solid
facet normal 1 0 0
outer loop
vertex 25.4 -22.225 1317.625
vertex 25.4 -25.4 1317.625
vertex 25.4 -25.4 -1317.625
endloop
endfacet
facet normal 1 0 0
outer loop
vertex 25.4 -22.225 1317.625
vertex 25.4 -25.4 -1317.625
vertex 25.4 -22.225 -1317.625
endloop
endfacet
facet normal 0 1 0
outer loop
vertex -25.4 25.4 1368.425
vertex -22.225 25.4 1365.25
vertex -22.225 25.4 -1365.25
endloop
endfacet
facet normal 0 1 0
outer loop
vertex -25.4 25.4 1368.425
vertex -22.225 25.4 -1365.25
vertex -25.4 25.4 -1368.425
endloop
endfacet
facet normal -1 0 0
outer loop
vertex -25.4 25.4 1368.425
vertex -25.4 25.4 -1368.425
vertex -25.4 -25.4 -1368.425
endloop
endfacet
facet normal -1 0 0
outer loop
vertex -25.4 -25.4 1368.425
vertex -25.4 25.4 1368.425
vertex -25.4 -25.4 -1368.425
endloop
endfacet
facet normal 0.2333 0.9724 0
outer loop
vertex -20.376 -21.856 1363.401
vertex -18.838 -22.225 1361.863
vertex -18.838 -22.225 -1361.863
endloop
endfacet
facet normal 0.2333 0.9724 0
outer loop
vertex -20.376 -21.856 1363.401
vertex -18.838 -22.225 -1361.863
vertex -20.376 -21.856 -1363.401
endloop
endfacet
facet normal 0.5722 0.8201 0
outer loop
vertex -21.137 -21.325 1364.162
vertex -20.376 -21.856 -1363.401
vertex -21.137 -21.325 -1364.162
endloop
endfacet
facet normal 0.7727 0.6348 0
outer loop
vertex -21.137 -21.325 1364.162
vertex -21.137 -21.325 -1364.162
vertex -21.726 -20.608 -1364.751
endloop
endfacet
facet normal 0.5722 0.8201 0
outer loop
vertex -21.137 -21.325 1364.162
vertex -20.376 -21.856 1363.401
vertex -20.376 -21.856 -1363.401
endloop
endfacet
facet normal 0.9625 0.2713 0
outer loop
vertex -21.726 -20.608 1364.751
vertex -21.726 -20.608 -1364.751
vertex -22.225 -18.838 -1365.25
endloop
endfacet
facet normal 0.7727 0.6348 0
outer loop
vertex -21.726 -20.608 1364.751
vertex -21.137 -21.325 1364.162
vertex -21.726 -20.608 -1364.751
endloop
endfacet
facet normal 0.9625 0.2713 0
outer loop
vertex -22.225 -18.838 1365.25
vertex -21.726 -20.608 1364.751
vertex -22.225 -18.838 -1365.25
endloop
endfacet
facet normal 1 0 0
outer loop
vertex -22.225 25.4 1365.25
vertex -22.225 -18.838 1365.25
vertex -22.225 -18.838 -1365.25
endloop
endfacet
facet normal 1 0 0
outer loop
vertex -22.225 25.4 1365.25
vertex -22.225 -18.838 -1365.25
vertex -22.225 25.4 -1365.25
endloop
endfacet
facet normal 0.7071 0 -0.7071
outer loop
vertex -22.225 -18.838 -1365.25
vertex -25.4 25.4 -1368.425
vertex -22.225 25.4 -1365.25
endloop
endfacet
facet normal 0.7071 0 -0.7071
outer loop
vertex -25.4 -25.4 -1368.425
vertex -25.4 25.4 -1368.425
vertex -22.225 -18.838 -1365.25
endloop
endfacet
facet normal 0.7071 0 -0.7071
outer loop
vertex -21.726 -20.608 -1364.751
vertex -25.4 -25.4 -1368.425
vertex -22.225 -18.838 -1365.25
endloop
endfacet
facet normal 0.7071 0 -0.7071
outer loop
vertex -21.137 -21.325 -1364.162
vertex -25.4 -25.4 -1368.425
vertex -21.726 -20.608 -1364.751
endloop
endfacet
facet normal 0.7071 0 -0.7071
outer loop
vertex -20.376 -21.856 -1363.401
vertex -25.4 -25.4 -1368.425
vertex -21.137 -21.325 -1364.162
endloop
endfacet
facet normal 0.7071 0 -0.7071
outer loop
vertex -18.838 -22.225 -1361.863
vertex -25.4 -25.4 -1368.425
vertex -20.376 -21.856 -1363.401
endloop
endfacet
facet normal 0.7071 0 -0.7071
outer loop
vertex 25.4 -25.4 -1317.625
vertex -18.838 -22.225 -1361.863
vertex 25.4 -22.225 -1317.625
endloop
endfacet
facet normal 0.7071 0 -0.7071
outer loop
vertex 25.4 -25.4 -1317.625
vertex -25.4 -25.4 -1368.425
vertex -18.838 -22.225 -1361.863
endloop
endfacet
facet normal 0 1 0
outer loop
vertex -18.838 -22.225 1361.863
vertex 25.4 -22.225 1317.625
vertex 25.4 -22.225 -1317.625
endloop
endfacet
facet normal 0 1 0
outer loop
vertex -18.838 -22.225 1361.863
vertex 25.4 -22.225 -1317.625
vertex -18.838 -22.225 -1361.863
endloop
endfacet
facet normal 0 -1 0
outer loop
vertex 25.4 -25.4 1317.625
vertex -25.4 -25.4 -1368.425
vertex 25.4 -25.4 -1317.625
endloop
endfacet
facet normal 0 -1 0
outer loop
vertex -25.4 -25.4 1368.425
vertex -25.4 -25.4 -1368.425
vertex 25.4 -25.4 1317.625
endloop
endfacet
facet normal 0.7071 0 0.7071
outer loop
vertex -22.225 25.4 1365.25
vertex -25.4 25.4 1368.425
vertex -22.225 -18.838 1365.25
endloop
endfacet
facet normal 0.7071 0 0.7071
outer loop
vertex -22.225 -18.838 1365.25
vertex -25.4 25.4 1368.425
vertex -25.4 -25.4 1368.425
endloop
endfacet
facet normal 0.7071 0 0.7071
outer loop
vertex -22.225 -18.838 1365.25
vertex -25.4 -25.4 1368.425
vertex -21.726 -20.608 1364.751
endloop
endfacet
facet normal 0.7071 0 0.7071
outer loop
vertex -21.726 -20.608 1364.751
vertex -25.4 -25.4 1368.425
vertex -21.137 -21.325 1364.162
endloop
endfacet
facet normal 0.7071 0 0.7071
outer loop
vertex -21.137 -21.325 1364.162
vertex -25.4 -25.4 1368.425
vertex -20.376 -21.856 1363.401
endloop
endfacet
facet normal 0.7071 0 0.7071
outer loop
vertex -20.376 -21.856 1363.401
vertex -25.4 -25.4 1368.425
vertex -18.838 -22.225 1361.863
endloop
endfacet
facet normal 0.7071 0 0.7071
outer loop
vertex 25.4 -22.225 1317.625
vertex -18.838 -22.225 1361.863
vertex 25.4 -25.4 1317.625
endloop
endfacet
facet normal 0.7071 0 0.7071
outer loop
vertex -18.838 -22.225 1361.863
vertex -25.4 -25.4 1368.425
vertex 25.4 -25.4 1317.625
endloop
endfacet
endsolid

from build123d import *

# Parameters (mm, degrees)
BOSS_EXTRUDE1_DEPTH      = 1368.425
BOSS_EXTRUDE1_DEPTH_BACK = 1368.425
CUT_EXTRUDE1_DEPTH       = 48.625
CUT_EXTRUDE1_DEPTH_BACK  = 4.175


with BuildPart() as part:
    # Sketch4 → Boss-Extrude1 (new body, two sides)
    with BuildSketch(Plane.XY) as boss_extrude1_sk:
        with BuildLine():
            Line((-22.225, -18.838333333), (-22.225, 25.4))
            Line((-22.225, 25.4), (-25.4, 25.4))
            Line((-25.4, 25.4), (-25.4, -25.4))
            Line((-25.4, -25.4), (25.4, -25.4))
            Line((25.4, -25.4), (25.4, -22.225))
            Line((25.4, -22.225), (-18.838333333, -22.225))
            ThreePointArc((-18.838333333, -22.225), (-21.233068299, -21.233068299), (-22.225, -18.838333333))
        make_face()
    extrude(amount=BOSS_EXTRUDE1_DEPTH)
    extrude(boss_extrude1_sk.sketch, amount=-BOSS_EXTRUDE1_DEPTH_BACK)

    # Sketch5 → Cut-Extrude1 (cut, two sides)
    with BuildSketch(Plane(origin=(0, -22.225, 0), x_dir=(1, 0, 0), z_dir=(0, 1, 0))) as cut_extrude1_sk:
        Polygon((-25.4, 1368.425), (25.4, 1317.625), (25.4, 1368.425), align=None)
        Polygon((25.4, -1368.425), (-25.4, -1368.425), (25.4, -1317.625), align=None)
    extrude(amount=CUT_EXTRUDE1_DEPTH, mode=Mode.SUBTRACT)
    extrude(cut_extrude1_sk.sketch, amount=-CUT_EXTRUDE1_DEPTH_BACK, mode=Mode.SUBTRACT)


solid = part.part
